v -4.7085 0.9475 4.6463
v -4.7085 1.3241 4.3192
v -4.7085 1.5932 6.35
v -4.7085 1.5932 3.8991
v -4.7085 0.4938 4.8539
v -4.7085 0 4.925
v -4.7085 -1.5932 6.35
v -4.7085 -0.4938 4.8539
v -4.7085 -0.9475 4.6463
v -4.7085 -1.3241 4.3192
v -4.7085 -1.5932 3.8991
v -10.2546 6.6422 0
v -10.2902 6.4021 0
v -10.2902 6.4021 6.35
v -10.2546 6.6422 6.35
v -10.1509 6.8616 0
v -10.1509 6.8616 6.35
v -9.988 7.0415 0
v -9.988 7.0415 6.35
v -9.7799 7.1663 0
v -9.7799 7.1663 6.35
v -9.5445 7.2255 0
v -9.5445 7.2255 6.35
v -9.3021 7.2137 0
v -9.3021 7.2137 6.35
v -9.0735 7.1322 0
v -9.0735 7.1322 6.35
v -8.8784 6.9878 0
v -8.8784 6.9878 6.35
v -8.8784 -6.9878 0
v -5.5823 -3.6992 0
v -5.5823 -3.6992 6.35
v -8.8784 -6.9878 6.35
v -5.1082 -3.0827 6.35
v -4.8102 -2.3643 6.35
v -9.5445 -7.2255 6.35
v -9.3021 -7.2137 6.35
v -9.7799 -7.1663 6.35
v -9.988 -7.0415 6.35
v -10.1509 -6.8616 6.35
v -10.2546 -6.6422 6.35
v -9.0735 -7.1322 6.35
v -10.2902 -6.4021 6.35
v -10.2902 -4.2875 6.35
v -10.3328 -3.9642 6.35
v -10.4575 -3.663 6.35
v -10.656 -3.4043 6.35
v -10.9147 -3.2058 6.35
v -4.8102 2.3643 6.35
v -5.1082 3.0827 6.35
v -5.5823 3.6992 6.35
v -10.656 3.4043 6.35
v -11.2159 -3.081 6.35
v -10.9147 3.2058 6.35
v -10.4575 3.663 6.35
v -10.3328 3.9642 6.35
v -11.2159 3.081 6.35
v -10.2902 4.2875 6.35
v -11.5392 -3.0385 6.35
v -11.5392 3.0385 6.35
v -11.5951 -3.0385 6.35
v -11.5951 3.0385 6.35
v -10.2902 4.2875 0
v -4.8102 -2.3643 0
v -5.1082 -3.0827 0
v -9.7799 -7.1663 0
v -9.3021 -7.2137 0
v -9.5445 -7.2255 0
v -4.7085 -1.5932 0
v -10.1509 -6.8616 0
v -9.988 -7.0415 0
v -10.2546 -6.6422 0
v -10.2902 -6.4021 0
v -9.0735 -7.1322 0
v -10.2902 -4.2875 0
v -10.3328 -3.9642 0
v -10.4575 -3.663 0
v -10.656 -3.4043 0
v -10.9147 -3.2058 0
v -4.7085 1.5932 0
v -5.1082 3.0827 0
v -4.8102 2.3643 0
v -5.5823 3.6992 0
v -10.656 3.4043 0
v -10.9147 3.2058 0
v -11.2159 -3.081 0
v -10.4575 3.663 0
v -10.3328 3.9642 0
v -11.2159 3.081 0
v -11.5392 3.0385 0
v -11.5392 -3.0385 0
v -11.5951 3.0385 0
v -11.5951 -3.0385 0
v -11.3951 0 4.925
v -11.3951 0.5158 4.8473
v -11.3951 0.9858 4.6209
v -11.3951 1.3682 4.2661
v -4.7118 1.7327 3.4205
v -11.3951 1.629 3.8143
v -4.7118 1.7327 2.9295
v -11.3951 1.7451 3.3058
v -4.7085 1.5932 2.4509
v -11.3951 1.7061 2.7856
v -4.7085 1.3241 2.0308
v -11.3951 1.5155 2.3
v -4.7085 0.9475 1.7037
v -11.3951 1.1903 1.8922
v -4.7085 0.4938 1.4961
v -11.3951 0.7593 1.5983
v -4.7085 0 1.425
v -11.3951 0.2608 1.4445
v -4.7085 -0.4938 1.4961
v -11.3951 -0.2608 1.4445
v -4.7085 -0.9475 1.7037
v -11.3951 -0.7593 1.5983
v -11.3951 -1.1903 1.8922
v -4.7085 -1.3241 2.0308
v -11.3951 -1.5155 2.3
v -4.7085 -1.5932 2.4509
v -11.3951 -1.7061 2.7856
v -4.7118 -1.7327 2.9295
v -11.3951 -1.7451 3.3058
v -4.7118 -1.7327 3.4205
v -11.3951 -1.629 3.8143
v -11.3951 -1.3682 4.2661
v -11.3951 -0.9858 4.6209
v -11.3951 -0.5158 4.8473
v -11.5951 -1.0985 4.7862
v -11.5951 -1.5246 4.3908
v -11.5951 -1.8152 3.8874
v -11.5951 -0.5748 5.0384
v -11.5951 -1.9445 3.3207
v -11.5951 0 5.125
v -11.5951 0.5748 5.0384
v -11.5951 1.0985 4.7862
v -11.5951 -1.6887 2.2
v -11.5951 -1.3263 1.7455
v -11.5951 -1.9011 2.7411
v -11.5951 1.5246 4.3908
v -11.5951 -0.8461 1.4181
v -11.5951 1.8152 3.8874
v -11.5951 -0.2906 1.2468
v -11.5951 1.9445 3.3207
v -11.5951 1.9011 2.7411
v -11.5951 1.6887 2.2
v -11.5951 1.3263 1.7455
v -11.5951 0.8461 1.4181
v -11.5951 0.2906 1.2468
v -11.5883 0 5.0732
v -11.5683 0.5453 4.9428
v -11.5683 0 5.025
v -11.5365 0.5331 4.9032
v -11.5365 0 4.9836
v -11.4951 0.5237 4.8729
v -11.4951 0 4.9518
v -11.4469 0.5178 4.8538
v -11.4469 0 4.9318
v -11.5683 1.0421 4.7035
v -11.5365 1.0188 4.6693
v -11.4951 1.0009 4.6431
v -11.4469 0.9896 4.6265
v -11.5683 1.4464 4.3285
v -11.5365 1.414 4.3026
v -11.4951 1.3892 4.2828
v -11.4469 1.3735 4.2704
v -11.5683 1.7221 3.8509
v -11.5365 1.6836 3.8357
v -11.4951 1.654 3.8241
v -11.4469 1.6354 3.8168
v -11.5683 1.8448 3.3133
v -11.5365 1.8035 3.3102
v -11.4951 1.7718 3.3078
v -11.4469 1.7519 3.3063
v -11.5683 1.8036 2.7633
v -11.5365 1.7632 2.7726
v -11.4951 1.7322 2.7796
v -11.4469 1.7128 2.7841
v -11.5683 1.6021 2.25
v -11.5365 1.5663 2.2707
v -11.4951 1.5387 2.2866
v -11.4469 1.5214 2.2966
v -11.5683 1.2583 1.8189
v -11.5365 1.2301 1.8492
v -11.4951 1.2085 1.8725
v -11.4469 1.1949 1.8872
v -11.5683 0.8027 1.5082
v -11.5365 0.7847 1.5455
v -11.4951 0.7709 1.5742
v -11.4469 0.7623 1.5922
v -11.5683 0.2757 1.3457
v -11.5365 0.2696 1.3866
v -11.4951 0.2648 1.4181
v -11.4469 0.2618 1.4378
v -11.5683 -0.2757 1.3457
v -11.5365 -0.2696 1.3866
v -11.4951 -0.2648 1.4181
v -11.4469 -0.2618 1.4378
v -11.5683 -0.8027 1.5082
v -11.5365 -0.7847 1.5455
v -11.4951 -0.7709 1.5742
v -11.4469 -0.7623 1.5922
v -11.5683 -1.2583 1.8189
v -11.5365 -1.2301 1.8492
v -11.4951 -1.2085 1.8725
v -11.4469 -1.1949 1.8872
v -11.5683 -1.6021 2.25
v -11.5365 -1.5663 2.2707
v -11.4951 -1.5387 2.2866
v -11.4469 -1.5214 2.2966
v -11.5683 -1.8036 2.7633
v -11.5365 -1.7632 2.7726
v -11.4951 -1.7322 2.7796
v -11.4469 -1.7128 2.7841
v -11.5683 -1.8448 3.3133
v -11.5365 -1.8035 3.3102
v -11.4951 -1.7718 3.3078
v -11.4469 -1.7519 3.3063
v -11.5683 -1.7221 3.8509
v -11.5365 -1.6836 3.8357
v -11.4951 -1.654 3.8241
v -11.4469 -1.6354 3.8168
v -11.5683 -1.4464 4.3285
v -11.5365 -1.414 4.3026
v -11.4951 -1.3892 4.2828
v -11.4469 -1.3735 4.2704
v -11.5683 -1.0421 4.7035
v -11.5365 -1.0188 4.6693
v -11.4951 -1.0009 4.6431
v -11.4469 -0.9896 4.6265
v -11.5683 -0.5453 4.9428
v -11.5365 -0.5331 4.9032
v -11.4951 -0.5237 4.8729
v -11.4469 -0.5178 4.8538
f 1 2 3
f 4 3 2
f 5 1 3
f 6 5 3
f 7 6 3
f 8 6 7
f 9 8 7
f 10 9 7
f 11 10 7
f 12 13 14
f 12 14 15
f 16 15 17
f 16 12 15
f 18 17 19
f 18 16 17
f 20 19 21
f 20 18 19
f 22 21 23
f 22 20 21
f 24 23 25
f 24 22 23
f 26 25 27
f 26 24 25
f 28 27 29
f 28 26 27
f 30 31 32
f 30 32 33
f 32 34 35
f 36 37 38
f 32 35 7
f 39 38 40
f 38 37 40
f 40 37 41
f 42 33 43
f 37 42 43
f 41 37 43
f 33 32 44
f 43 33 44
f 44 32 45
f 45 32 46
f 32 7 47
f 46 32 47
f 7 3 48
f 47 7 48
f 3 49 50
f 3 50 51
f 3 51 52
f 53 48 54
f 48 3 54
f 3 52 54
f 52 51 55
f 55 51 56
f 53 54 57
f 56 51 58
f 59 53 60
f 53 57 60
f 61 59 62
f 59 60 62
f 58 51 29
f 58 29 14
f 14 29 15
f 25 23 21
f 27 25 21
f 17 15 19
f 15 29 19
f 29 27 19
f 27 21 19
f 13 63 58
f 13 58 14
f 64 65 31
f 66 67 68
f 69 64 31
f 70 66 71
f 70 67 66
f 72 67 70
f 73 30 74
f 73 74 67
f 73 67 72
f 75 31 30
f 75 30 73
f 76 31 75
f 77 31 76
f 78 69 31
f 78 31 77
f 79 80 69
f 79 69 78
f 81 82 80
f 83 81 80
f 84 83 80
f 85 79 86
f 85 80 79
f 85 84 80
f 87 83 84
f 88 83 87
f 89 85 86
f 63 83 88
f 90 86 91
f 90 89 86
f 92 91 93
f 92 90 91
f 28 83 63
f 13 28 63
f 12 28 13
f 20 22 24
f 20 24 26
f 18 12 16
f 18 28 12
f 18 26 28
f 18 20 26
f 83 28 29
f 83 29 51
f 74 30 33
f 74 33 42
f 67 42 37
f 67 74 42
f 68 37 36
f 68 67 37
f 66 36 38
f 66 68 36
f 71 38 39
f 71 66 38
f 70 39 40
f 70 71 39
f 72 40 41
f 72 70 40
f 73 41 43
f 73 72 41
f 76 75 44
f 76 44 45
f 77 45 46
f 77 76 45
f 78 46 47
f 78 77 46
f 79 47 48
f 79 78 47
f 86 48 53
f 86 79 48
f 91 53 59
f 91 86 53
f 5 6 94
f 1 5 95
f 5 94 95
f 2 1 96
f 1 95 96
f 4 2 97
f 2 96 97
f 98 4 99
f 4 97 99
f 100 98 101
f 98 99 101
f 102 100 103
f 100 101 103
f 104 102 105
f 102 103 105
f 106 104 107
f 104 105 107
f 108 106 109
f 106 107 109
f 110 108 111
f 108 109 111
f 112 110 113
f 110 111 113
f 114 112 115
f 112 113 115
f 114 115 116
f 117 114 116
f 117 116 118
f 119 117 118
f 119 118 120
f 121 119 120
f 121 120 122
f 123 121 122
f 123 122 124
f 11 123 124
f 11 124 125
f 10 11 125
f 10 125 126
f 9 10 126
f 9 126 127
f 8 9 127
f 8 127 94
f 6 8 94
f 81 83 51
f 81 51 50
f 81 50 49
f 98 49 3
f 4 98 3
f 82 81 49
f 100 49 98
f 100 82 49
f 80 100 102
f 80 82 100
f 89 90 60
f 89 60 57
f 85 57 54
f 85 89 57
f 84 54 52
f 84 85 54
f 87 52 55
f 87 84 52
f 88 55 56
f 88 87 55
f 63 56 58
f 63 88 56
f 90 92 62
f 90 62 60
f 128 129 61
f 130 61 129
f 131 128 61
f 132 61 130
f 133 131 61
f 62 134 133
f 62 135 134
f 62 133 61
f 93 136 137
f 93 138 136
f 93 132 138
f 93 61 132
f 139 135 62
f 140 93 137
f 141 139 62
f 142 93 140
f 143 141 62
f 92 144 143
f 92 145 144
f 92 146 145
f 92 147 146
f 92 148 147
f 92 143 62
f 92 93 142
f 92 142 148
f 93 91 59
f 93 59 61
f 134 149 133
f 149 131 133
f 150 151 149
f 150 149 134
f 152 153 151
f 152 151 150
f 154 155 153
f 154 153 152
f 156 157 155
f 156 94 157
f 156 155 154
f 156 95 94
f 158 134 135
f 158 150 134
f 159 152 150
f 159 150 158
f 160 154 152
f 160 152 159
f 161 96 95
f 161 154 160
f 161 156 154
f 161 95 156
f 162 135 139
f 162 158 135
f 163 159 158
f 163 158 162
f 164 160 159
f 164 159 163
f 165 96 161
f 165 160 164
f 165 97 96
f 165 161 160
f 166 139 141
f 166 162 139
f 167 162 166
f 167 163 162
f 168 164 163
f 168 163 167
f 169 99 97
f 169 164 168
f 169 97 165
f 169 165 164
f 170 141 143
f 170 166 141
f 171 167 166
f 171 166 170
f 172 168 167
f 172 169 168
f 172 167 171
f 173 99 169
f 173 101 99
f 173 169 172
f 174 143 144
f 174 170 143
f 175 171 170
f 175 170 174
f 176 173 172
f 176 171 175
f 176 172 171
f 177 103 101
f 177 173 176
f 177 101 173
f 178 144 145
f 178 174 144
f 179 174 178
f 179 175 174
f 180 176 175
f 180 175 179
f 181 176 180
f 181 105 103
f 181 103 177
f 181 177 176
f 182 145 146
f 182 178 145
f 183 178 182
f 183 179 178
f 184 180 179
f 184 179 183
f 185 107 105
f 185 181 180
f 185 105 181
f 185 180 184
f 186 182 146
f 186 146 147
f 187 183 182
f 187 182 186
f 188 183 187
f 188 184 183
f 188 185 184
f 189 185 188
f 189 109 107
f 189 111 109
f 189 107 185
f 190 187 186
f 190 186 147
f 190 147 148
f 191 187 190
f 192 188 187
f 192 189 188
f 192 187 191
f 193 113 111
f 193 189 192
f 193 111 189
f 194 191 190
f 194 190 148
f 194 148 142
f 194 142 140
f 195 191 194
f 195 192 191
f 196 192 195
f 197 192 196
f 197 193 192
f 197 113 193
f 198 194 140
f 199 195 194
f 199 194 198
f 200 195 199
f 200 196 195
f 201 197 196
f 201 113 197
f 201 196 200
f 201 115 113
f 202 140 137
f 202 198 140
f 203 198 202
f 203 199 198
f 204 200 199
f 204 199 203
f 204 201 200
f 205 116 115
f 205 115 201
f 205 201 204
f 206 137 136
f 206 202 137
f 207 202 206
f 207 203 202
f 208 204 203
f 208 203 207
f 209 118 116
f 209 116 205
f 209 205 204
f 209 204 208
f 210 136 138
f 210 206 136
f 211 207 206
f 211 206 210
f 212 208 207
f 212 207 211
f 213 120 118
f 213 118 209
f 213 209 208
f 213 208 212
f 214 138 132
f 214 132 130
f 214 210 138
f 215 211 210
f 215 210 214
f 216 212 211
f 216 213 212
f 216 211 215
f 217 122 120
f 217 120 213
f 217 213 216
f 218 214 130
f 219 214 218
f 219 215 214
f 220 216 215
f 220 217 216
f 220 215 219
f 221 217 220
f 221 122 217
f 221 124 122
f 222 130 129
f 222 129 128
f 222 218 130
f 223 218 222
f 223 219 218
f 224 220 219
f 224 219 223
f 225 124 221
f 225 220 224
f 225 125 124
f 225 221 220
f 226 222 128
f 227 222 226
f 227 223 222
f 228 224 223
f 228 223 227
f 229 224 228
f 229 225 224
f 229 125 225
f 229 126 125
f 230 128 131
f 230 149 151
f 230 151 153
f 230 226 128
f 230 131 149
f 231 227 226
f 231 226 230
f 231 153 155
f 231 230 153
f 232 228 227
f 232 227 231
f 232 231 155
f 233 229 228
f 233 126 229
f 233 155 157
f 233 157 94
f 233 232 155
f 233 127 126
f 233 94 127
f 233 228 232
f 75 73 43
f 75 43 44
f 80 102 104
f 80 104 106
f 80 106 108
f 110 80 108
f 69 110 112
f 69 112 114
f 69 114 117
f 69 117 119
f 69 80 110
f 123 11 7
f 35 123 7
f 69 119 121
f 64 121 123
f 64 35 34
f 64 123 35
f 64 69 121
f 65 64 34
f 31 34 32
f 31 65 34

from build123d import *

# Parameters (mm, degrees)
BOSS_EXTRUDE1_DEPTH = 6.35
CUT_EXTRUDE1_REACH  = 13.833
SKETCH2_R           = 1.75
FILLET1_R           = 0.2


with BuildPart() as part:
    # Sketch1 → Boss-Extrude1 (new body)
    with BuildSketch(Plane.XY):
        with BuildLine():
            Line((-11.5951, -3.038456882), (-11.5951, 3.038456882))
            Line((-11.5951, 3.038456882), (-11.539212407, 3.038456882))
            ThreePointArc((-11.539212407, 3.038456882), (-10.656027264, 3.404284146), (-10.2902, 4.287469289))
            Line((-10.2902, 4.287469289), (-10.2902, 6.402089023))
            ThreePointArc((-10.2902, 6.402089023), (-9.779862704, 7.166335846), (-8.878390822, 6.987825881))
            Line((-8.878390822, 6.987825881), (-5.582265308, 3.69923341))
            ThreePointArc((-5.582265308, 3.69923341), (-4.935610063, 2.733240723), (-4.7085, 1.593185507))
            Line((-4.7085, 1.593185507), (-4.7085, -1.593185507))
            ThreePointArc((-4.7085, -1.593185507), (-4.935610063, -2.733240723), (-5.582265308, -3.69923341))
            Line((-5.582265308, -3.69923341), (-8.878390822, -6.987825881))
            ThreePointArc((-8.878390822, -6.987825881), (-9.779862704, -7.166335846), (-10.2902, -6.402089023))
            Line((-10.2902, -6.402089023), (-10.2902, -4.287469289))
            ThreePointArc((-10.2902, -4.287469289), (-10.656027264, -3.404284146), (-11.539212407, -3.038456882))
            Line((-11.539212407, -3.038456882), (-11.5951, -3.038456882))
        make_face()
    extrude(amount=BOSS_EXTRUDE1_DEPTH)

    # Sketch2 → Cut-Extrude1 (cut, up to next)
    with BuildSketch(Plane.ZY.offset(11.5951), mode=Mode.PRIVATE) as cut_extrude1_sk1:
        with Locations((3.175, 0)):
            Circle(SKETCH2_R)
    cut_extrude1_tool1 = extrude(cut_extrude1_sk1.sketch, amount=-CUT_EXTRUDE1_REACH, mode=Mode.PRIVATE) & part.part
    add(cut_extrude1_tool1.solids().sort_by_distance((-11.5951, 0, 3.175))[0], mode=Mode.SUBTRACT)

    # Fillet1
    fillet1_edges = [part.edges().sort_by_distance(p)[0] for p in [
        (-11.5951, 0, 1.425),
    ]]
    fillet(fillet1_edges, radius=FILLET1_R)


solid = part.part
